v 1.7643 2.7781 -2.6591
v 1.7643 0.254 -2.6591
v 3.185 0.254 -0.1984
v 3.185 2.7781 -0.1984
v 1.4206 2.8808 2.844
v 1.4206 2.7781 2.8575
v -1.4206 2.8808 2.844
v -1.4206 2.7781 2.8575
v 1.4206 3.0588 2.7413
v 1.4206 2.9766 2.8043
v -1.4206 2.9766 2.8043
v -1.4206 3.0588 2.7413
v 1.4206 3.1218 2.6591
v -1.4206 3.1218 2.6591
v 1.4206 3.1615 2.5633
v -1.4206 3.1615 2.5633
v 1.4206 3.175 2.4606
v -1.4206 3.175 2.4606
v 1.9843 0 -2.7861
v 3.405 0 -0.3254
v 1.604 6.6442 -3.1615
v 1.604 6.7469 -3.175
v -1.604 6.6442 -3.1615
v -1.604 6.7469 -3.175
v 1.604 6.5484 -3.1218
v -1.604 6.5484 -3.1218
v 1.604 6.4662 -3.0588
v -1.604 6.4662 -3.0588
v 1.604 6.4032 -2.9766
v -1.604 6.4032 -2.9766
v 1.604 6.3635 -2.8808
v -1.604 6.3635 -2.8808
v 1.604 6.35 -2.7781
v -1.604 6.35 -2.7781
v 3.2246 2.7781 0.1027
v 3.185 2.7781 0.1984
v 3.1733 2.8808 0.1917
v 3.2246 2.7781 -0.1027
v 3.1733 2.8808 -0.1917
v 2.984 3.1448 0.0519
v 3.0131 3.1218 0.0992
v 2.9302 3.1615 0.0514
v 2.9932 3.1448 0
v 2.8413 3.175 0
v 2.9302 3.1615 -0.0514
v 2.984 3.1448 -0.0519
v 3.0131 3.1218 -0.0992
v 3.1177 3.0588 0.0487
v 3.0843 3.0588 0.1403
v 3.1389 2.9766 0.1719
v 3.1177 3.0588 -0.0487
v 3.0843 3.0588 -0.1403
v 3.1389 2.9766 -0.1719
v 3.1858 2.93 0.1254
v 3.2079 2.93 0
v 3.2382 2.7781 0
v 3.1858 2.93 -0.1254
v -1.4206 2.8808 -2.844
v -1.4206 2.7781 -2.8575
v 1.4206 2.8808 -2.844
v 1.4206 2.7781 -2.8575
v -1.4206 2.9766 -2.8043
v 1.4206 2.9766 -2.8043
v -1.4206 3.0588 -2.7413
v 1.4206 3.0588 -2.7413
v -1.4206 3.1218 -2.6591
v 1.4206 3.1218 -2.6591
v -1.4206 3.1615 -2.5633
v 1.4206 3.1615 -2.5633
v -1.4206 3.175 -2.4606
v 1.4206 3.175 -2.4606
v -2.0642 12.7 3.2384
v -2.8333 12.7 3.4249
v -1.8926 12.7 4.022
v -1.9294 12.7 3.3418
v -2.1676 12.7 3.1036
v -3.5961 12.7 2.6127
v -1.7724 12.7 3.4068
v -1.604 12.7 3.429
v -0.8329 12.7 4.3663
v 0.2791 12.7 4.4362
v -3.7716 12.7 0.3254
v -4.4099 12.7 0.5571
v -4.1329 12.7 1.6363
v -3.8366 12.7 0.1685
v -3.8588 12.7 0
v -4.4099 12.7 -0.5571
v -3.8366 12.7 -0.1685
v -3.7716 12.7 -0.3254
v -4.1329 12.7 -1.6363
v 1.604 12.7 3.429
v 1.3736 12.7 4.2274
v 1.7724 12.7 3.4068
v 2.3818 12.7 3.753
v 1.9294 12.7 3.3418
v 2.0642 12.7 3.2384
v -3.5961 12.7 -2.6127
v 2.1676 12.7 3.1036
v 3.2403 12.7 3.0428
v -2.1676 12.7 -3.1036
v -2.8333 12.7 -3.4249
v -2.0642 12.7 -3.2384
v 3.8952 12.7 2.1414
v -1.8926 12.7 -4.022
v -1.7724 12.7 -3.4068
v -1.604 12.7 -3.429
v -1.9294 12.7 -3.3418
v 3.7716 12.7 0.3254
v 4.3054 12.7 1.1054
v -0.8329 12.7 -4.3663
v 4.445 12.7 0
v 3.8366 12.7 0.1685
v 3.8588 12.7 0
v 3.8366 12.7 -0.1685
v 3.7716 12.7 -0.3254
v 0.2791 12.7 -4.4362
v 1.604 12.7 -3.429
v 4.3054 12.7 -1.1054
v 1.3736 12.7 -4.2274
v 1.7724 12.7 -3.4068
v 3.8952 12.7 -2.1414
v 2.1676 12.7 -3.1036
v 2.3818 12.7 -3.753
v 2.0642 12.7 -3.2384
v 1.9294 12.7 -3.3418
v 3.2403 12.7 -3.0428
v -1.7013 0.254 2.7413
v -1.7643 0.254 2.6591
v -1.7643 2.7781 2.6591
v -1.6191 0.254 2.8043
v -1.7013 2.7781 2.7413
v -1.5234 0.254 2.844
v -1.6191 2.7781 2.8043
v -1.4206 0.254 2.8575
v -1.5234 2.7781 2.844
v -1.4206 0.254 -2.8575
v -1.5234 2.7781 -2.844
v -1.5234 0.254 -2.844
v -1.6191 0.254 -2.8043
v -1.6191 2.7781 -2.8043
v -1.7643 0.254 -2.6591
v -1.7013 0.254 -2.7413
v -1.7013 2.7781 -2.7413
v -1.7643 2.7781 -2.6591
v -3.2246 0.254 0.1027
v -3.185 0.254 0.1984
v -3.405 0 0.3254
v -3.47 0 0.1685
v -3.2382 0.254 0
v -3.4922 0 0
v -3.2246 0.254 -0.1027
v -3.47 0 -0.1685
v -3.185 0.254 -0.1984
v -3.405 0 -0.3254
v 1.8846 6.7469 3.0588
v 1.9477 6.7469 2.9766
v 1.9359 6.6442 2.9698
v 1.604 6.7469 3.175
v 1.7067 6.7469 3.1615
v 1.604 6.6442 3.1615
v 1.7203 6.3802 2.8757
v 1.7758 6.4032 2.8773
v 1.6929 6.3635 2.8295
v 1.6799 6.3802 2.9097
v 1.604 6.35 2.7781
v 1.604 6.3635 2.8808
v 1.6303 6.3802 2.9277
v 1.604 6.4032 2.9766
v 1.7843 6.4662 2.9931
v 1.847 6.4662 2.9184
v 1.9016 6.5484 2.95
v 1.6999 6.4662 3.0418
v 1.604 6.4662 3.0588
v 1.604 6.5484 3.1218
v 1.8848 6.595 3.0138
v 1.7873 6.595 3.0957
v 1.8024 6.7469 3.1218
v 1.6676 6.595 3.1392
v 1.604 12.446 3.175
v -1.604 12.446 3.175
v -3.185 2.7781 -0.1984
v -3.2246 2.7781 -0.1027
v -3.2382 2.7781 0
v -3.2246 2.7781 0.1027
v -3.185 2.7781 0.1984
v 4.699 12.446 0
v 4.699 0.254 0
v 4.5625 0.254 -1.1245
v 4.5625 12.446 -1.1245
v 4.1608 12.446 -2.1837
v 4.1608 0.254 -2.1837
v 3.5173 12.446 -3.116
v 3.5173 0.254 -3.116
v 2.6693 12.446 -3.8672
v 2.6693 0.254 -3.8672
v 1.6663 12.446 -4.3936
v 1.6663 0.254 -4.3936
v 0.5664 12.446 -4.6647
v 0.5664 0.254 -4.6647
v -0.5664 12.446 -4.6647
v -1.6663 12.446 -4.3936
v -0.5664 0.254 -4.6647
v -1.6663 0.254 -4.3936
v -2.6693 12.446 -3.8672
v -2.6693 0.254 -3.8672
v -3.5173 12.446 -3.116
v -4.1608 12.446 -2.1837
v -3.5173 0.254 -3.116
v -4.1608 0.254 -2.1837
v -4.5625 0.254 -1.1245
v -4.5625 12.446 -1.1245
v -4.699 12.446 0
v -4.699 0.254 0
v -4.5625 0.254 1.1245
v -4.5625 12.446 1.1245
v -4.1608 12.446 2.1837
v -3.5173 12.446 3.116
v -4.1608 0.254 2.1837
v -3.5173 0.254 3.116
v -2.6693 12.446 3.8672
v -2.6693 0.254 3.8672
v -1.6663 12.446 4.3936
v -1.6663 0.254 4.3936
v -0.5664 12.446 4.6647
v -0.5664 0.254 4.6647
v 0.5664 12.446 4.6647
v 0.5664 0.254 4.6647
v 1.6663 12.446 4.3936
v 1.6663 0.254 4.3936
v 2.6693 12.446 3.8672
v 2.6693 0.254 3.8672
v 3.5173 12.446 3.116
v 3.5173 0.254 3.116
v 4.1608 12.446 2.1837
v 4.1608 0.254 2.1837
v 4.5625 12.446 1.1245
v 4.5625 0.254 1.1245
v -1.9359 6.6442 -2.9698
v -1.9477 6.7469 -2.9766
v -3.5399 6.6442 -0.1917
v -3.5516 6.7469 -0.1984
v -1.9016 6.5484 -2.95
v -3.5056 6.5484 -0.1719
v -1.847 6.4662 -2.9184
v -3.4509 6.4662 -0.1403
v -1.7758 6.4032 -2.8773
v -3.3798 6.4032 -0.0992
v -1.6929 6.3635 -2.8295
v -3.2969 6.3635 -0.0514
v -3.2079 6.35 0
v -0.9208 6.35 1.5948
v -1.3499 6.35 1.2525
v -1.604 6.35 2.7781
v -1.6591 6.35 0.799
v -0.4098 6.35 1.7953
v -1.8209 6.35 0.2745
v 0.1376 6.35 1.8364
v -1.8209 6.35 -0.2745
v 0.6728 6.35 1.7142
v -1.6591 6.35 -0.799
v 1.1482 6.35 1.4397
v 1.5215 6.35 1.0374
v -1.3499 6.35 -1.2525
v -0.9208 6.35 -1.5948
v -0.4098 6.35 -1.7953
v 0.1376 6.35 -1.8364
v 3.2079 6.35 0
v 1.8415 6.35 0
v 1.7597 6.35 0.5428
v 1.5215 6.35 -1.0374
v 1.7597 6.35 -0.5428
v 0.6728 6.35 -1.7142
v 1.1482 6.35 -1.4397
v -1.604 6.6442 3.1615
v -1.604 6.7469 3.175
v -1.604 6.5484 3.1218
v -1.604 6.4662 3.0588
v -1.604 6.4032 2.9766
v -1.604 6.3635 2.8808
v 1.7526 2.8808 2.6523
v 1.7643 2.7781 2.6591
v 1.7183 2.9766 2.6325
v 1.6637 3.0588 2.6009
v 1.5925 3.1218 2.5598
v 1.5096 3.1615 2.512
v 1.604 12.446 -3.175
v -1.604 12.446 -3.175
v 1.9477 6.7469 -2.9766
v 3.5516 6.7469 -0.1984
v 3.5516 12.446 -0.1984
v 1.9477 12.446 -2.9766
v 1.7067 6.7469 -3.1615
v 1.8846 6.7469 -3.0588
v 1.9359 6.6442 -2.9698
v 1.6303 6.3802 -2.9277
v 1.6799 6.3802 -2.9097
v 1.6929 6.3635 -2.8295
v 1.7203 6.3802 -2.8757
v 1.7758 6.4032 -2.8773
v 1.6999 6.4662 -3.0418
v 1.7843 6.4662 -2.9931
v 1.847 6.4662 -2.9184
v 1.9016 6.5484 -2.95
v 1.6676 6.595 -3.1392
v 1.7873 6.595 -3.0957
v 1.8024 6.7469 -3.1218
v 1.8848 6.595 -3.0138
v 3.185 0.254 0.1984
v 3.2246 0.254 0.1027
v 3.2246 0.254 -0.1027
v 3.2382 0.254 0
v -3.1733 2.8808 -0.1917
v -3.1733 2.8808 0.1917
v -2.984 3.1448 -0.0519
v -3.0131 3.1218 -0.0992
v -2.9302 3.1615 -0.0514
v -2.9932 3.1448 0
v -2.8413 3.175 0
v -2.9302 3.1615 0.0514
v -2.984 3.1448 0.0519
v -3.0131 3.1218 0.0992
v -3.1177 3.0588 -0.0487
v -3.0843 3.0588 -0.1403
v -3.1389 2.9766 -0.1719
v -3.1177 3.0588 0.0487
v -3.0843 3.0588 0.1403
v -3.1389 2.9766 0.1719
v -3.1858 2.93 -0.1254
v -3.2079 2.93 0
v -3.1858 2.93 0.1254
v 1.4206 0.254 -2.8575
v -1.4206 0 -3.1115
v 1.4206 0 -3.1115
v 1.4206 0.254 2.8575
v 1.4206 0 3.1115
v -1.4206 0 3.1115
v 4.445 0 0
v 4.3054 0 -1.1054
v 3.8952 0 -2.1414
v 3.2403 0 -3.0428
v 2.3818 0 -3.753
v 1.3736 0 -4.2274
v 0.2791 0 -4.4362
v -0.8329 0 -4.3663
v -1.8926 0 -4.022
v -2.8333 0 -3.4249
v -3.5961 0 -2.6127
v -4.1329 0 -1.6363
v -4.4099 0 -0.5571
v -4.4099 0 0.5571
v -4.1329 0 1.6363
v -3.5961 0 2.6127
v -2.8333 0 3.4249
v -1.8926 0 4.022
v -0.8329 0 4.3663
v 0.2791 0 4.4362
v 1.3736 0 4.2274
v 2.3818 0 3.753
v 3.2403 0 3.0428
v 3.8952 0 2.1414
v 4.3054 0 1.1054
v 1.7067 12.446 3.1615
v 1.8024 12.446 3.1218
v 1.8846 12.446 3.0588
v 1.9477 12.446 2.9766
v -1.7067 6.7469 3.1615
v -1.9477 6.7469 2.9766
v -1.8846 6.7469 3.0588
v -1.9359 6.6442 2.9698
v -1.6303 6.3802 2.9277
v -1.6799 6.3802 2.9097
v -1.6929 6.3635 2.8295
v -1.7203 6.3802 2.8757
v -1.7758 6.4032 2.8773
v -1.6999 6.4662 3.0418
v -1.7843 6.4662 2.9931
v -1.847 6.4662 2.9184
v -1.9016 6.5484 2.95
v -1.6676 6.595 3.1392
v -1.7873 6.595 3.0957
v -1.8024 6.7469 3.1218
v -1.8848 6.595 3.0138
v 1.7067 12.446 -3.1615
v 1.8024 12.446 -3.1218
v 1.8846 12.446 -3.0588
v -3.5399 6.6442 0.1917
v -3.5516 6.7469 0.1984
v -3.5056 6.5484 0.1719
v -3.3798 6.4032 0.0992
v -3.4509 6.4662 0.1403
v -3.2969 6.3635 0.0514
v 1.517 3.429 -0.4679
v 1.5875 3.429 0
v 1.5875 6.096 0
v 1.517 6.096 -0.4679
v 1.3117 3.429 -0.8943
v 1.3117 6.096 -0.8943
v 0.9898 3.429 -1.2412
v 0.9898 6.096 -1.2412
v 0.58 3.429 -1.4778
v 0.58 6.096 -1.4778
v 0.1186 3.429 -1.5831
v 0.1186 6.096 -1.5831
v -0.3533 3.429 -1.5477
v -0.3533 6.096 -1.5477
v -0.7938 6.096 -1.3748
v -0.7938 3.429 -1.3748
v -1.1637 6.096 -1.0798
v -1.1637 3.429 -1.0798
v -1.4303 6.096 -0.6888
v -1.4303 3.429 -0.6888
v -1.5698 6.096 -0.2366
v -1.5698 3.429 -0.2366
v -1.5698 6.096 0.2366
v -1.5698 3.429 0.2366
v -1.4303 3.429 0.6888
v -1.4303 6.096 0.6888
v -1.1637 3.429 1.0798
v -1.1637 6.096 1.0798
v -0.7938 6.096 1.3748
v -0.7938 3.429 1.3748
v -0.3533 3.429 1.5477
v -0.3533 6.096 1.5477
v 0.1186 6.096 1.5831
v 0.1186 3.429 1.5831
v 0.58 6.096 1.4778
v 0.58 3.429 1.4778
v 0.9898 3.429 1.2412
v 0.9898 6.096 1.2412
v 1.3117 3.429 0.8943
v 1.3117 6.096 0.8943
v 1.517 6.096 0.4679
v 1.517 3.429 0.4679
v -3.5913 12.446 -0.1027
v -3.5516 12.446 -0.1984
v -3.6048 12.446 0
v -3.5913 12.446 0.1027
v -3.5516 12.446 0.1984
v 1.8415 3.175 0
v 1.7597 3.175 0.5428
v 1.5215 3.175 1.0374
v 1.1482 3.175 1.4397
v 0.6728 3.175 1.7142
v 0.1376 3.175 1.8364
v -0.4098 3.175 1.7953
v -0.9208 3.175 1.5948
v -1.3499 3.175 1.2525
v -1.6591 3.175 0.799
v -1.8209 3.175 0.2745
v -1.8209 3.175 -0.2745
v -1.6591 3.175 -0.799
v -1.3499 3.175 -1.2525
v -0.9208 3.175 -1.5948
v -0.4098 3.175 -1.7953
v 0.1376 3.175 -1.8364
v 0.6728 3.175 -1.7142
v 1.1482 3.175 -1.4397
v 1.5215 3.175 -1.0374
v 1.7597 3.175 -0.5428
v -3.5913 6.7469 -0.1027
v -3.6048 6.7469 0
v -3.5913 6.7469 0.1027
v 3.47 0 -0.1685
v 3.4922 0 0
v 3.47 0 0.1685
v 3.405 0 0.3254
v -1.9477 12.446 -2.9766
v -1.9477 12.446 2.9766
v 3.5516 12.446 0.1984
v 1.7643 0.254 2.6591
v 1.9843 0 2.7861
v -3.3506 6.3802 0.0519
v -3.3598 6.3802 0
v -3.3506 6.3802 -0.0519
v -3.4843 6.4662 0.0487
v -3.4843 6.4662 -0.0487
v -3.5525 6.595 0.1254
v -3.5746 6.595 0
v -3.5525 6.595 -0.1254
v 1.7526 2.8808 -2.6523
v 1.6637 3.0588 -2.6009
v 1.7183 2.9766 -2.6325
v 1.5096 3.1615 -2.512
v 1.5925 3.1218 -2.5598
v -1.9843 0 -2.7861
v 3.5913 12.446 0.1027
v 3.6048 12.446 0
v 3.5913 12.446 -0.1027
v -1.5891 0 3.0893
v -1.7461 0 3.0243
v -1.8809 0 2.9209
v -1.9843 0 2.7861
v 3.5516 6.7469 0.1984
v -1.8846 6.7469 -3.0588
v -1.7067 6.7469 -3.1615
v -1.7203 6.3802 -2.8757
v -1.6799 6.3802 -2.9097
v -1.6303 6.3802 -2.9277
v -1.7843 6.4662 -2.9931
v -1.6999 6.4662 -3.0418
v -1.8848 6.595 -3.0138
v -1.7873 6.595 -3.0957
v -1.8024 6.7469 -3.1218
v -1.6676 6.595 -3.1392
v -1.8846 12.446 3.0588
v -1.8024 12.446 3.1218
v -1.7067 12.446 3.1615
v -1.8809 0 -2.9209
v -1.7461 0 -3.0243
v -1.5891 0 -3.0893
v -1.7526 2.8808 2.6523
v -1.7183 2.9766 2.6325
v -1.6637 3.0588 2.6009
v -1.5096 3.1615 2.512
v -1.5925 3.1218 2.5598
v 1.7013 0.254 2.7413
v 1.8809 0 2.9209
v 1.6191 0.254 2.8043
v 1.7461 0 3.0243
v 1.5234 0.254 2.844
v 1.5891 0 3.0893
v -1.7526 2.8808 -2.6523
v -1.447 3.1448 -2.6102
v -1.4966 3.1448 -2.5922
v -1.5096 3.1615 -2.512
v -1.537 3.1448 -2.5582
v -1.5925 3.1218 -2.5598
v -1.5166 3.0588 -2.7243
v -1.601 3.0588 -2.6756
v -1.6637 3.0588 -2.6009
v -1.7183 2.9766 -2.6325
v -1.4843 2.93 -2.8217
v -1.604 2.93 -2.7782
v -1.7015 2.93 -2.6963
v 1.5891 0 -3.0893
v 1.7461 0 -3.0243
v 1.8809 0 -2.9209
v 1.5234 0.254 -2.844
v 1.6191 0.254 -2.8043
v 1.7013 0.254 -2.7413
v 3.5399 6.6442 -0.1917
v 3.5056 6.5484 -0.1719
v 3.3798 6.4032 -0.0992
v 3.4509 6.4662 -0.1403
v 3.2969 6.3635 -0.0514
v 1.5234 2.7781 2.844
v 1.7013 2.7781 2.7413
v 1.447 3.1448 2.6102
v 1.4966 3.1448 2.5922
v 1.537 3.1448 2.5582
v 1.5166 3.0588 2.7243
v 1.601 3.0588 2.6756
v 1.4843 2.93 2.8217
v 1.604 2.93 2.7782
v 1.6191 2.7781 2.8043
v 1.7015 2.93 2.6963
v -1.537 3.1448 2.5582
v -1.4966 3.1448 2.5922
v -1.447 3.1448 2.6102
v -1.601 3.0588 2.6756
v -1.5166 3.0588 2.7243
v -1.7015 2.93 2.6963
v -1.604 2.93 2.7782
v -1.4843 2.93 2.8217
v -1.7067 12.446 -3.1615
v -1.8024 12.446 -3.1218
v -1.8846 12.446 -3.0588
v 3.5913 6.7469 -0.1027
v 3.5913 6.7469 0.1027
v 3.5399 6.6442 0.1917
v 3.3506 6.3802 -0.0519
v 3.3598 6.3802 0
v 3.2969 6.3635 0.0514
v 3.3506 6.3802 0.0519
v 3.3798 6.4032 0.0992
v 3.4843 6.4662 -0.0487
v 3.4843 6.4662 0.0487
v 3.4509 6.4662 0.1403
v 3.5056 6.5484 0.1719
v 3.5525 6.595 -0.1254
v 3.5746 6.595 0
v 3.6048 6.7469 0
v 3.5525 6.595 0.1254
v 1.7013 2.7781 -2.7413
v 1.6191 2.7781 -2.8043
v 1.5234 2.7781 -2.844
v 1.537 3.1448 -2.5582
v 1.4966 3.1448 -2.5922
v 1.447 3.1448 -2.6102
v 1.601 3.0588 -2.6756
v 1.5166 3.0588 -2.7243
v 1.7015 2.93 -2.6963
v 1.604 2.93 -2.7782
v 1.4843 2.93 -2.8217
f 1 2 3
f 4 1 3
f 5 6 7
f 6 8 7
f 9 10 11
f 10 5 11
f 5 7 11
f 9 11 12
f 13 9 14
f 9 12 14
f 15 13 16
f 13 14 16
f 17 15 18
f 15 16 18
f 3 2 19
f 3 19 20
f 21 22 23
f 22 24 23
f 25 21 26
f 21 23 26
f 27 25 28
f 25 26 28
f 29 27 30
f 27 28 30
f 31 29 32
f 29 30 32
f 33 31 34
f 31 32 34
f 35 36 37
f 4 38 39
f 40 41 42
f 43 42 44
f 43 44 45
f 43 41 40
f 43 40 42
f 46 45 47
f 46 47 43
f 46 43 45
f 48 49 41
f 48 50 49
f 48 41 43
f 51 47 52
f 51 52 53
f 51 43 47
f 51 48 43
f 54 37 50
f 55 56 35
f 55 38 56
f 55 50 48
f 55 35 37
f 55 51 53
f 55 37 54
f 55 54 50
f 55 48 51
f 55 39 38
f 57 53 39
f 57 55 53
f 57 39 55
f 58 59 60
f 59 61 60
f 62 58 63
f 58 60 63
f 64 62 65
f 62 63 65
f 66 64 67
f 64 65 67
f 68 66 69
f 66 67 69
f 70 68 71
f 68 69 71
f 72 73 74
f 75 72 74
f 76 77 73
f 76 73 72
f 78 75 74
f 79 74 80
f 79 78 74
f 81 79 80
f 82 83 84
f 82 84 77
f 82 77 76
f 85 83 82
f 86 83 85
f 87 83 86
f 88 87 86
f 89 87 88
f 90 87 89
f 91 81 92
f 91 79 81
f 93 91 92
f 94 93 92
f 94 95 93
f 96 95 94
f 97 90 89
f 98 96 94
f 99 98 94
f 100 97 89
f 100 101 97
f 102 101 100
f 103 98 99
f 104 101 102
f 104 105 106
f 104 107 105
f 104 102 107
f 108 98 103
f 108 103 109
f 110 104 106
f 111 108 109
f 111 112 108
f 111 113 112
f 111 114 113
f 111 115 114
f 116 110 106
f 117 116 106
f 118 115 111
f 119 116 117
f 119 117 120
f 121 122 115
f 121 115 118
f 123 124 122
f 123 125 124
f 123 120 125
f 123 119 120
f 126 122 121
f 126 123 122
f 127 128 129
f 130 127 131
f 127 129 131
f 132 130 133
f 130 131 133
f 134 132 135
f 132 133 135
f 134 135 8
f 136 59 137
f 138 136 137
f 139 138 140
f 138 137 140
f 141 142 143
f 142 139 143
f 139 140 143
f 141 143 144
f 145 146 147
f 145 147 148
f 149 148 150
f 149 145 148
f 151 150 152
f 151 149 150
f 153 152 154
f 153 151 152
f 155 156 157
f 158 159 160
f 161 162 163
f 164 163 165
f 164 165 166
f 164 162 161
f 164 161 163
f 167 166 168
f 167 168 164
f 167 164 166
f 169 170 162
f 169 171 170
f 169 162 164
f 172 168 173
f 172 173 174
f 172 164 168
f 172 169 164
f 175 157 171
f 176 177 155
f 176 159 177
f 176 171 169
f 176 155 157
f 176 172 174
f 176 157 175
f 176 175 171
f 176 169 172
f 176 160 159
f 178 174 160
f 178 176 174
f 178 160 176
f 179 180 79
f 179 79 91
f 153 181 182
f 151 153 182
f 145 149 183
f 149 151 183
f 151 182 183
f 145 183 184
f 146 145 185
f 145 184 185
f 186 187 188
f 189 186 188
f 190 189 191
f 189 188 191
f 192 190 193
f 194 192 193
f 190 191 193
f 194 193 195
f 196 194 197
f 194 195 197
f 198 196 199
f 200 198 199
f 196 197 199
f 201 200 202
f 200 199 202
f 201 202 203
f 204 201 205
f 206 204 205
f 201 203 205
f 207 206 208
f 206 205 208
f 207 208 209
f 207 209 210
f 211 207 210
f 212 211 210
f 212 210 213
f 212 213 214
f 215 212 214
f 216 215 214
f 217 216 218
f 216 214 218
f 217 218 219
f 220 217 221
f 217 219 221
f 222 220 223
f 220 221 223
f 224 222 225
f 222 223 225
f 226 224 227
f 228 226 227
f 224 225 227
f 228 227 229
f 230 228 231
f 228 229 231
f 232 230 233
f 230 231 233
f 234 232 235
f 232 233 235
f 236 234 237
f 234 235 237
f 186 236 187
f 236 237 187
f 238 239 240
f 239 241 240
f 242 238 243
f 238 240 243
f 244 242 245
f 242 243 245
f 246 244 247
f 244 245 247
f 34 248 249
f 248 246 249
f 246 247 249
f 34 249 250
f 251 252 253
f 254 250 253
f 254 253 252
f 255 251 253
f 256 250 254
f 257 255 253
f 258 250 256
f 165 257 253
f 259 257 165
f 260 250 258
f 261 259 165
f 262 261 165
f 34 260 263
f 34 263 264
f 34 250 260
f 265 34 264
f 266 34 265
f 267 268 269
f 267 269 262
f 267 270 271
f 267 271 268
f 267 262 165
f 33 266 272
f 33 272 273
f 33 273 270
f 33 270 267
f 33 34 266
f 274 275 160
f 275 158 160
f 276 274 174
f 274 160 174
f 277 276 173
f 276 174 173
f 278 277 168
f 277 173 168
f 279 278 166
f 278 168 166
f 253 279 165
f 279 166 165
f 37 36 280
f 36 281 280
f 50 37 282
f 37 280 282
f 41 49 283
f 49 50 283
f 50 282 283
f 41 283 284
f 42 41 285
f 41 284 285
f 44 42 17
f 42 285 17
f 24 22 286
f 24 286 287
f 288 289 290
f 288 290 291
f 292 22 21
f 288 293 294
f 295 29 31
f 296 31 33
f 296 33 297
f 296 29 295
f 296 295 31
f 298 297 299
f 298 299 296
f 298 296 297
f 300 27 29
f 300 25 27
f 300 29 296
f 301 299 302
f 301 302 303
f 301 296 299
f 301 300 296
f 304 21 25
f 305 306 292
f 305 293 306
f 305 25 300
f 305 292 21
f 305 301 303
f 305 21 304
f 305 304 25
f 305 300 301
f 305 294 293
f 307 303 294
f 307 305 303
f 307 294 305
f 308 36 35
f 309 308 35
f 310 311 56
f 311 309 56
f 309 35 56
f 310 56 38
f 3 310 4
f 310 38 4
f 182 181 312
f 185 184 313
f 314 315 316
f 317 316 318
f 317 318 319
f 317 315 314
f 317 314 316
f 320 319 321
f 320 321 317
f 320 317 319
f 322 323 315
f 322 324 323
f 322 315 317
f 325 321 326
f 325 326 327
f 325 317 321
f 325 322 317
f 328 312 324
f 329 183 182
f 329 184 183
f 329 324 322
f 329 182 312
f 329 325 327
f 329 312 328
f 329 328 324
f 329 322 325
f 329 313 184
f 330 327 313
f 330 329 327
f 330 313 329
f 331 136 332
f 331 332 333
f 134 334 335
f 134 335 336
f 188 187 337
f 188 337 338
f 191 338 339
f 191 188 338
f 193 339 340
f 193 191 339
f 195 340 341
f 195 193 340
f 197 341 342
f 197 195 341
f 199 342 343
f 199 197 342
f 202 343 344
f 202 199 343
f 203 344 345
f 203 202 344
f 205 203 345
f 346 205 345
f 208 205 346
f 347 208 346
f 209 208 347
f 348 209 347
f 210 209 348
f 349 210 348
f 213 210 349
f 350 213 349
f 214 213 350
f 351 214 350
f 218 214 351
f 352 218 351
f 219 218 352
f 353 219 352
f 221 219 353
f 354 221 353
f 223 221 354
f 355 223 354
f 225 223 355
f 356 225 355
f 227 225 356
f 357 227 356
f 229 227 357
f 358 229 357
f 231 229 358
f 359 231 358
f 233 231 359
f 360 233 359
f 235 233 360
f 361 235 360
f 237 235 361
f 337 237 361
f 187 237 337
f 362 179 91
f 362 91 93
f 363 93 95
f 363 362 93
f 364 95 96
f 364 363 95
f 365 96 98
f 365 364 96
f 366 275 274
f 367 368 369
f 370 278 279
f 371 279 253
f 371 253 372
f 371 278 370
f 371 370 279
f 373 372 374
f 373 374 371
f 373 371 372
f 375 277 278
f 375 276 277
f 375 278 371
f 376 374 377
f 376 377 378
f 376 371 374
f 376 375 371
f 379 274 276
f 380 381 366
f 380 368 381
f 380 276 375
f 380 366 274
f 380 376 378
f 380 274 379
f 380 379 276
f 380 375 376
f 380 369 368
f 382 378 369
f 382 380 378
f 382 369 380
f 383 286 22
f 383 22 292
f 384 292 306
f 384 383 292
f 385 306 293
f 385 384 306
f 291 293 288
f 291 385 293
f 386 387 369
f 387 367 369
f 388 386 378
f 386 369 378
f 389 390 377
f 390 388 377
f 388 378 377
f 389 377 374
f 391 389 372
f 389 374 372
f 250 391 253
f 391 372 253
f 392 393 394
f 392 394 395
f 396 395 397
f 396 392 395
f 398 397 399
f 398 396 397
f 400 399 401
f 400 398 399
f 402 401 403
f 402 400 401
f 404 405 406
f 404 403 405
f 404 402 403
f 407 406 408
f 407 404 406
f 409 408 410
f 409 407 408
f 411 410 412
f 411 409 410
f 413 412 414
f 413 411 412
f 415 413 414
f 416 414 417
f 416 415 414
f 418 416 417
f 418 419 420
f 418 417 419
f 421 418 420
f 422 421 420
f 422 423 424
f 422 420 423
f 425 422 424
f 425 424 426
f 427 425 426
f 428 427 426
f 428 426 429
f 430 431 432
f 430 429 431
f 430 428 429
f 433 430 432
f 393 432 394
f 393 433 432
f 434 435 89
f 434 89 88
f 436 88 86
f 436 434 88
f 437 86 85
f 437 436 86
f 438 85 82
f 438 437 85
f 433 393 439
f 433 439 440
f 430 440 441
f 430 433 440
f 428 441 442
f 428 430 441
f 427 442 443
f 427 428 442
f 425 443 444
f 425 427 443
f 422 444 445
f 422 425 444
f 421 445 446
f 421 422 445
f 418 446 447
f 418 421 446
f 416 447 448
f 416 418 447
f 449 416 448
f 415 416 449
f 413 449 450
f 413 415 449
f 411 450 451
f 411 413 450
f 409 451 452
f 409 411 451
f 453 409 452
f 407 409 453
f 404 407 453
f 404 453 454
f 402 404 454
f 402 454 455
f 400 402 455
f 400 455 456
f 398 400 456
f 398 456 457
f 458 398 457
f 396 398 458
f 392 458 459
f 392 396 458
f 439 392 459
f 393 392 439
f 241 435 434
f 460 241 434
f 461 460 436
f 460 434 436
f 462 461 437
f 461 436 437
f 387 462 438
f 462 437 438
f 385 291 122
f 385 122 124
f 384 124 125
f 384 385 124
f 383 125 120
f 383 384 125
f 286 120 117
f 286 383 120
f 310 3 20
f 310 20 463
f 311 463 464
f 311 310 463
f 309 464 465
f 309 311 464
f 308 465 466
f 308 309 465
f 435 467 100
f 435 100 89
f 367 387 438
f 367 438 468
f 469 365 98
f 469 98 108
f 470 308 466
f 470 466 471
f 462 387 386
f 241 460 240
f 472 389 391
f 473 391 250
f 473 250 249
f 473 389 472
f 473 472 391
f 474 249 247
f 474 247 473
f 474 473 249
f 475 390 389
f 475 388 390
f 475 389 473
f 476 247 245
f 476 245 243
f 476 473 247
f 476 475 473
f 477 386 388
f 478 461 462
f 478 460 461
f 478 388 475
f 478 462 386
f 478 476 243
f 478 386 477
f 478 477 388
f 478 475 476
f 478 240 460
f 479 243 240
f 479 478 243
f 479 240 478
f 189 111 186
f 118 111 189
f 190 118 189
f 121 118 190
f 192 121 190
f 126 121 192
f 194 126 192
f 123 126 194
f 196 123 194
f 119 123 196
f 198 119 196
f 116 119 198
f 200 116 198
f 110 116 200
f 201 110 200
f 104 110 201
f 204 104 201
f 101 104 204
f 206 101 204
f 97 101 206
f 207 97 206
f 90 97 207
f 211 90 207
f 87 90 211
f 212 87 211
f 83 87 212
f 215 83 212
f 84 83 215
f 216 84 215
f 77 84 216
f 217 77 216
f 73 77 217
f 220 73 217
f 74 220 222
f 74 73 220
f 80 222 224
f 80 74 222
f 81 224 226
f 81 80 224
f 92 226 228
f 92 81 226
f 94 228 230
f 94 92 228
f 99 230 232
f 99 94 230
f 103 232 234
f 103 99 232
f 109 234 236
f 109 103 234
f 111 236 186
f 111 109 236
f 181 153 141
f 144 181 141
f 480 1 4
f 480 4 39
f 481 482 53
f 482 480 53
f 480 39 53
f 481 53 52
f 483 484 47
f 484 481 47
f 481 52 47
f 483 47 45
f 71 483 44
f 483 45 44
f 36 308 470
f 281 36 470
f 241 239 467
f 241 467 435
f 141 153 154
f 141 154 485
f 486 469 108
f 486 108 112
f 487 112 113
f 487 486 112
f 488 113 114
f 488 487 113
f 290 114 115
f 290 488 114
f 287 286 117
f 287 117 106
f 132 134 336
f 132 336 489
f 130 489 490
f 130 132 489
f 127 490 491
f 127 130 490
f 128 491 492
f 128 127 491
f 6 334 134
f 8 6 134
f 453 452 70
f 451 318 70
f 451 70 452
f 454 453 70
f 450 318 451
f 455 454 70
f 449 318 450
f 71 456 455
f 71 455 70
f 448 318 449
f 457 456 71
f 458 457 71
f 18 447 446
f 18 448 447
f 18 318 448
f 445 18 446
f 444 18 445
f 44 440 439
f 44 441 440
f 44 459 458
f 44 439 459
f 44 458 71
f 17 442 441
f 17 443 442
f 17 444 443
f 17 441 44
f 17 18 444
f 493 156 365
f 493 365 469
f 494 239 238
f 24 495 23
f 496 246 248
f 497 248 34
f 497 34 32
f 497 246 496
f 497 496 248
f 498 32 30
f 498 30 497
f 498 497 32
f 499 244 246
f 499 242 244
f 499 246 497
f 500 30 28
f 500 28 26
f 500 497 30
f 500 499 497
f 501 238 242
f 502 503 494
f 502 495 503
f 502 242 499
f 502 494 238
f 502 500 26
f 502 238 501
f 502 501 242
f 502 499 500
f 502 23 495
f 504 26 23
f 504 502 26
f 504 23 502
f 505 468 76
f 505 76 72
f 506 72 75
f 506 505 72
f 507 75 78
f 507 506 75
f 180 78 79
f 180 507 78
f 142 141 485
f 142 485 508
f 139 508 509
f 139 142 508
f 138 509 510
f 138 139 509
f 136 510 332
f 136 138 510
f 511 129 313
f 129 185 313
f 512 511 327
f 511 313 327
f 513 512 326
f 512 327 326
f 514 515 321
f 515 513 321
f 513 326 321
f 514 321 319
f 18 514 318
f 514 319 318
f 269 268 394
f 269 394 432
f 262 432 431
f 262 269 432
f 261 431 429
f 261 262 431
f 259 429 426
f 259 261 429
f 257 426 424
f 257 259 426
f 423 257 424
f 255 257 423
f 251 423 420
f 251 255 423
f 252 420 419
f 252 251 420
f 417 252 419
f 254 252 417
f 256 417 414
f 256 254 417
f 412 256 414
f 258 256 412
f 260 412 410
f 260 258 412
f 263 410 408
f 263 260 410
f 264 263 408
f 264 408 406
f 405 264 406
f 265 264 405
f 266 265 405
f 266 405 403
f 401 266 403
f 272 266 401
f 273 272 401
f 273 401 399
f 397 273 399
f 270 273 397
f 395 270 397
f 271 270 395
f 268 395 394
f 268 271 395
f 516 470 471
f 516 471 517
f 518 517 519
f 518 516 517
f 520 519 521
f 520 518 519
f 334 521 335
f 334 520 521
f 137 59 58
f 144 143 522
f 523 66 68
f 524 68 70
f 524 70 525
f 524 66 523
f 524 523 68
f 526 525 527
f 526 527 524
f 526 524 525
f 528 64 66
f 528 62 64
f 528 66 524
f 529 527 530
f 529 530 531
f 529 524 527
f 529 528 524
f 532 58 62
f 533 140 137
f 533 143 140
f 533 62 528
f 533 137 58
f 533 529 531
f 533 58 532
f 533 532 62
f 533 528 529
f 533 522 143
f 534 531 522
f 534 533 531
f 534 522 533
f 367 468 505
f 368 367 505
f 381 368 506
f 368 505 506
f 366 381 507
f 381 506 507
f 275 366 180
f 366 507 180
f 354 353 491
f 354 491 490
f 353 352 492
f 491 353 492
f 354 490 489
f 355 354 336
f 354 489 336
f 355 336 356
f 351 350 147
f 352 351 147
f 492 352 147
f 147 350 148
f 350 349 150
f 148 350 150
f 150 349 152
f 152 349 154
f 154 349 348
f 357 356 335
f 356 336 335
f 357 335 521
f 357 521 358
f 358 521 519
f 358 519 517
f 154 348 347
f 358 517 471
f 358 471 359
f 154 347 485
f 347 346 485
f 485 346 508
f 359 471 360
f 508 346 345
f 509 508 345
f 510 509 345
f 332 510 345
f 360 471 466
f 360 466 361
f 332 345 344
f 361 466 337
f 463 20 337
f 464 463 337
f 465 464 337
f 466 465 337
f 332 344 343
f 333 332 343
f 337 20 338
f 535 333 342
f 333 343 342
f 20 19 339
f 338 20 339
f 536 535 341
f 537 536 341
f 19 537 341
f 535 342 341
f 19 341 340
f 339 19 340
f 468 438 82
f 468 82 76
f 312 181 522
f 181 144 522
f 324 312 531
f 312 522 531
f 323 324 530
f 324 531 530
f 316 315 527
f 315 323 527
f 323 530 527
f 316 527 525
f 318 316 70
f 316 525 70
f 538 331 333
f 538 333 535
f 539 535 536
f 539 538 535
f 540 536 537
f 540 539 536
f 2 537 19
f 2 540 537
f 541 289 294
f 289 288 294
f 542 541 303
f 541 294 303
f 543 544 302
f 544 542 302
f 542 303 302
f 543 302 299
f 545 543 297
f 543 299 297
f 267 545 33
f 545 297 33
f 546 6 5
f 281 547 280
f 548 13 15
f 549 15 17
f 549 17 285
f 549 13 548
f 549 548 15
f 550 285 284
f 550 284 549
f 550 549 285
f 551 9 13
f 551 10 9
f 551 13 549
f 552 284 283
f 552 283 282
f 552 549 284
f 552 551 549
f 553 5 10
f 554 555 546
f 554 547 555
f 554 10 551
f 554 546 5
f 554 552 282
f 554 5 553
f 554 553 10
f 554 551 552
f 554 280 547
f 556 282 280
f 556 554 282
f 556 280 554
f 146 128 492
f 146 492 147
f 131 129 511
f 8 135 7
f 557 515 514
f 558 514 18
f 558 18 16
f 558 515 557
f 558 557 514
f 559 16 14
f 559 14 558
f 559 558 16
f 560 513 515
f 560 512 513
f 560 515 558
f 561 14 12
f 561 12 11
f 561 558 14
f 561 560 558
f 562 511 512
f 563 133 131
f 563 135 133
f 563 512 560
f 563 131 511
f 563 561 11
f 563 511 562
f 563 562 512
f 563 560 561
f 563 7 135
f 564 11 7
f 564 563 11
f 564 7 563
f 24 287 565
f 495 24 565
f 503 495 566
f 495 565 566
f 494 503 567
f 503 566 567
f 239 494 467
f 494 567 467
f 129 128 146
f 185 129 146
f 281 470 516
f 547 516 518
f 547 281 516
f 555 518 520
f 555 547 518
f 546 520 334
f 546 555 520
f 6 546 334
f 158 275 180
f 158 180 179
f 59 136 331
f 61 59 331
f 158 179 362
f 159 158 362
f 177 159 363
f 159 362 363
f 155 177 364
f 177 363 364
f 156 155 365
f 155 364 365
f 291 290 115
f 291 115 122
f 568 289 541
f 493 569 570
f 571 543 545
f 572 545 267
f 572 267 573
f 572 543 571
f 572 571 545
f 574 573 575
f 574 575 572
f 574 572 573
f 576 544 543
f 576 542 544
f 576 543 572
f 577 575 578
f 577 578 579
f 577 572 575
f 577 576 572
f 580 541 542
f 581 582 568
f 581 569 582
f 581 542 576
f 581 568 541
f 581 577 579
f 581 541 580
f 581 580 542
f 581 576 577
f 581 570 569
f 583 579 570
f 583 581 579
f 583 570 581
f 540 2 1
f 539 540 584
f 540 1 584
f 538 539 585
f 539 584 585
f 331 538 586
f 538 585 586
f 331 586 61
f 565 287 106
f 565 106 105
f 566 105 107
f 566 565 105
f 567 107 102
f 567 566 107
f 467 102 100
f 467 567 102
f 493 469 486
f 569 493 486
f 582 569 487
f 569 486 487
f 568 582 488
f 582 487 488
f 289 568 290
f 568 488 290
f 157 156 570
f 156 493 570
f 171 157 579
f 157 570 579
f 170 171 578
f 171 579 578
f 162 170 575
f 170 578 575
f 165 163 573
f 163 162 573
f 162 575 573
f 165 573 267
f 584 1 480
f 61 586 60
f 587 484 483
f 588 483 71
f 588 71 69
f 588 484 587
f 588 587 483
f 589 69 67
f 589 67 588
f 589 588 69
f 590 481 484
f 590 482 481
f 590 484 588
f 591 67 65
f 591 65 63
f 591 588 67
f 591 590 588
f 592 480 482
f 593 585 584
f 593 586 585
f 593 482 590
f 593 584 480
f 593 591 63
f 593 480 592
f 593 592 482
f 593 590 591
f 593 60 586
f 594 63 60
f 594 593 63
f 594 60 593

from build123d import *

# Parameters (mm, degrees)
SKETCH4_R           = 4.699
SKETCH4_R_2         = 1.5875
BOSS_EXTRUDE1_DEPTH = 12.7
CUT_EXTRUDE3_DEPTH  = 3.175
CUT_EXTRUDE2_START  = -6.35
CUT_EXTRUDE2_DEPTH  = 6.35
FILLET1_1_64_R      = 0.396875
CHAMFER1_SIZE       = 0.254


with BuildPart() as part:
    # Sketch4 → Boss-Extrude1 (new body)
    with BuildSketch(Plane(origin=(0, 0, 0), x_dir=(1, 0, 0), z_dir=(0, 1, 0))):
        Circle(SKETCH4_R)
        Circle(SKETCH4_R_2, mode=Mode.SUBTRACT)
    extrude(amount=BOSS_EXTRUDE1_DEPTH)

    # Sketch7 → Cut-Extrude3 (cut)
    with BuildSketch(Plane.XZ):
        Polygon((1.649778394, 2.8575), (-1.649778394, 2.8575), (-3.299556788, 0), (-1.649778394, -2.8575), (1.649778394, -2.8575), (3.299556788, 0), align=None)
    extrude(amount=-CUT_EXTRUDE3_DEPTH, mode=Mode.SUBTRACT)

    # Sketch6 → Cut-Extrude2 (cut)
    with BuildSketch(Plane(origin=(0, 12.7, 0), x_dir=(1, 0, 0), z_dir=(0, 1, 0)).offset(CUT_EXTRUDE2_START)):
        Polygon((1.833087105, 3.175), (-1.833087105, 3.175), (-3.666174209, 0), (-1.833087105, -3.175), (1.833087105, -3.175), (3.666174209, 0), align=None)
    extrude(amount=CUT_EXTRUDE2_DEPTH, mode=Mode.SUBTRACT)

    # Fillet1-1/64
    fillet1_1_64_edges = [part.edges().sort_by_distance(p)[0] for p in [
        (2.474667591, 3.175, 1.42875),
        (1.649778394, 1.5875, 2.8575),
        (2.474667591, 3.175, -1.42875),
        (3.299556788, 1.5875, 0),
        (0, 3.175, -2.8575),
        (1.649778394, 1.5875, -2.8575),
        (-2.474667591, 3.175, -1.42875),
        (-1.649778394, 1.5875, -2.8575),
        (-2.474667591, 3.175, 1.42875),
        (-3.299556788, 1.5875, 0),
        (0, 3.175, 2.8575),
        (-1.649778394, 1.5875, 2.8575),
        (0, 6.35, -3.175),
        (-1.833087105, 9.525, -3.175),
        (-2.749630657, 6.35, -1.5875),
        (-3.666174209, 9.525, 0),
        (-2.749630657, 6.35, 1.5875),
        (-1.833087105, 9.525, 3.175),
        (0, 6.35, 3.175),
        (1.833087105, 9.525, 3.175),
        (2.749630657, 6.35, 1.5875),
        (3.666174209, 9.525, 0),
        (2.749630657, 6.35, -1.5875),
        (1.833087105, 9.525, -3.175),
    ]]
    fillet(fillet1_1_64_edges, radius=FILLET1_1_64_R)

    # Chamfer1
    chamfer1_edges = [part.edges().sort_by_distance(p)[0] for p in [
        (-1.5875, 3.175, 0),
        (-4.699, 0, 0),
        (-1.5875, 6.35, 0),
        (-4.699, 12.7, 0),
        (-2.749630657, 12.7, 1.5875),
        (0, 12.7, 3.175),
        (2.749630657, 12.7, 1.5875),
        (2.749630657, 12.7, -1.5875),
        (0, 12.7, -3.175),
        (-2.749630657, 12.7, -1.5875),
        (0, 0, 2.8575),
        (-2.474667591, 0, 1.42875),
        (-2.474667591, 0, -1.42875),
        (0, 0, -2.8575),
        (2.474667591, 0, -1.42875),
        (2.474667591, 0, 1.42875),
        (-3.604777433, 12.7, 0),
        (-1.802388717, 12.7, 3.121828832),
        (1.802388717, 12.7, 3.121828832),
        (3.604777433, 12.7, 0),
        (1.802388717, 12.7, -3.121828832),
        (-1.802388717, 12.7, -3.121828832),
        (-1.619080006, 0, 2.804328832),
        (-3.238160012, 0, 0),
        (-1.619080006, 0, -2.804328832),
        (1.619080006, 0, -2.804328832),
        (3.238160012, 0, 0),
        (1.619080006, 0, 2.804328832),
    ]]
    chamfer(chamfer1_edges, length=CHAMFER1_SIZE)


solid = part.part
